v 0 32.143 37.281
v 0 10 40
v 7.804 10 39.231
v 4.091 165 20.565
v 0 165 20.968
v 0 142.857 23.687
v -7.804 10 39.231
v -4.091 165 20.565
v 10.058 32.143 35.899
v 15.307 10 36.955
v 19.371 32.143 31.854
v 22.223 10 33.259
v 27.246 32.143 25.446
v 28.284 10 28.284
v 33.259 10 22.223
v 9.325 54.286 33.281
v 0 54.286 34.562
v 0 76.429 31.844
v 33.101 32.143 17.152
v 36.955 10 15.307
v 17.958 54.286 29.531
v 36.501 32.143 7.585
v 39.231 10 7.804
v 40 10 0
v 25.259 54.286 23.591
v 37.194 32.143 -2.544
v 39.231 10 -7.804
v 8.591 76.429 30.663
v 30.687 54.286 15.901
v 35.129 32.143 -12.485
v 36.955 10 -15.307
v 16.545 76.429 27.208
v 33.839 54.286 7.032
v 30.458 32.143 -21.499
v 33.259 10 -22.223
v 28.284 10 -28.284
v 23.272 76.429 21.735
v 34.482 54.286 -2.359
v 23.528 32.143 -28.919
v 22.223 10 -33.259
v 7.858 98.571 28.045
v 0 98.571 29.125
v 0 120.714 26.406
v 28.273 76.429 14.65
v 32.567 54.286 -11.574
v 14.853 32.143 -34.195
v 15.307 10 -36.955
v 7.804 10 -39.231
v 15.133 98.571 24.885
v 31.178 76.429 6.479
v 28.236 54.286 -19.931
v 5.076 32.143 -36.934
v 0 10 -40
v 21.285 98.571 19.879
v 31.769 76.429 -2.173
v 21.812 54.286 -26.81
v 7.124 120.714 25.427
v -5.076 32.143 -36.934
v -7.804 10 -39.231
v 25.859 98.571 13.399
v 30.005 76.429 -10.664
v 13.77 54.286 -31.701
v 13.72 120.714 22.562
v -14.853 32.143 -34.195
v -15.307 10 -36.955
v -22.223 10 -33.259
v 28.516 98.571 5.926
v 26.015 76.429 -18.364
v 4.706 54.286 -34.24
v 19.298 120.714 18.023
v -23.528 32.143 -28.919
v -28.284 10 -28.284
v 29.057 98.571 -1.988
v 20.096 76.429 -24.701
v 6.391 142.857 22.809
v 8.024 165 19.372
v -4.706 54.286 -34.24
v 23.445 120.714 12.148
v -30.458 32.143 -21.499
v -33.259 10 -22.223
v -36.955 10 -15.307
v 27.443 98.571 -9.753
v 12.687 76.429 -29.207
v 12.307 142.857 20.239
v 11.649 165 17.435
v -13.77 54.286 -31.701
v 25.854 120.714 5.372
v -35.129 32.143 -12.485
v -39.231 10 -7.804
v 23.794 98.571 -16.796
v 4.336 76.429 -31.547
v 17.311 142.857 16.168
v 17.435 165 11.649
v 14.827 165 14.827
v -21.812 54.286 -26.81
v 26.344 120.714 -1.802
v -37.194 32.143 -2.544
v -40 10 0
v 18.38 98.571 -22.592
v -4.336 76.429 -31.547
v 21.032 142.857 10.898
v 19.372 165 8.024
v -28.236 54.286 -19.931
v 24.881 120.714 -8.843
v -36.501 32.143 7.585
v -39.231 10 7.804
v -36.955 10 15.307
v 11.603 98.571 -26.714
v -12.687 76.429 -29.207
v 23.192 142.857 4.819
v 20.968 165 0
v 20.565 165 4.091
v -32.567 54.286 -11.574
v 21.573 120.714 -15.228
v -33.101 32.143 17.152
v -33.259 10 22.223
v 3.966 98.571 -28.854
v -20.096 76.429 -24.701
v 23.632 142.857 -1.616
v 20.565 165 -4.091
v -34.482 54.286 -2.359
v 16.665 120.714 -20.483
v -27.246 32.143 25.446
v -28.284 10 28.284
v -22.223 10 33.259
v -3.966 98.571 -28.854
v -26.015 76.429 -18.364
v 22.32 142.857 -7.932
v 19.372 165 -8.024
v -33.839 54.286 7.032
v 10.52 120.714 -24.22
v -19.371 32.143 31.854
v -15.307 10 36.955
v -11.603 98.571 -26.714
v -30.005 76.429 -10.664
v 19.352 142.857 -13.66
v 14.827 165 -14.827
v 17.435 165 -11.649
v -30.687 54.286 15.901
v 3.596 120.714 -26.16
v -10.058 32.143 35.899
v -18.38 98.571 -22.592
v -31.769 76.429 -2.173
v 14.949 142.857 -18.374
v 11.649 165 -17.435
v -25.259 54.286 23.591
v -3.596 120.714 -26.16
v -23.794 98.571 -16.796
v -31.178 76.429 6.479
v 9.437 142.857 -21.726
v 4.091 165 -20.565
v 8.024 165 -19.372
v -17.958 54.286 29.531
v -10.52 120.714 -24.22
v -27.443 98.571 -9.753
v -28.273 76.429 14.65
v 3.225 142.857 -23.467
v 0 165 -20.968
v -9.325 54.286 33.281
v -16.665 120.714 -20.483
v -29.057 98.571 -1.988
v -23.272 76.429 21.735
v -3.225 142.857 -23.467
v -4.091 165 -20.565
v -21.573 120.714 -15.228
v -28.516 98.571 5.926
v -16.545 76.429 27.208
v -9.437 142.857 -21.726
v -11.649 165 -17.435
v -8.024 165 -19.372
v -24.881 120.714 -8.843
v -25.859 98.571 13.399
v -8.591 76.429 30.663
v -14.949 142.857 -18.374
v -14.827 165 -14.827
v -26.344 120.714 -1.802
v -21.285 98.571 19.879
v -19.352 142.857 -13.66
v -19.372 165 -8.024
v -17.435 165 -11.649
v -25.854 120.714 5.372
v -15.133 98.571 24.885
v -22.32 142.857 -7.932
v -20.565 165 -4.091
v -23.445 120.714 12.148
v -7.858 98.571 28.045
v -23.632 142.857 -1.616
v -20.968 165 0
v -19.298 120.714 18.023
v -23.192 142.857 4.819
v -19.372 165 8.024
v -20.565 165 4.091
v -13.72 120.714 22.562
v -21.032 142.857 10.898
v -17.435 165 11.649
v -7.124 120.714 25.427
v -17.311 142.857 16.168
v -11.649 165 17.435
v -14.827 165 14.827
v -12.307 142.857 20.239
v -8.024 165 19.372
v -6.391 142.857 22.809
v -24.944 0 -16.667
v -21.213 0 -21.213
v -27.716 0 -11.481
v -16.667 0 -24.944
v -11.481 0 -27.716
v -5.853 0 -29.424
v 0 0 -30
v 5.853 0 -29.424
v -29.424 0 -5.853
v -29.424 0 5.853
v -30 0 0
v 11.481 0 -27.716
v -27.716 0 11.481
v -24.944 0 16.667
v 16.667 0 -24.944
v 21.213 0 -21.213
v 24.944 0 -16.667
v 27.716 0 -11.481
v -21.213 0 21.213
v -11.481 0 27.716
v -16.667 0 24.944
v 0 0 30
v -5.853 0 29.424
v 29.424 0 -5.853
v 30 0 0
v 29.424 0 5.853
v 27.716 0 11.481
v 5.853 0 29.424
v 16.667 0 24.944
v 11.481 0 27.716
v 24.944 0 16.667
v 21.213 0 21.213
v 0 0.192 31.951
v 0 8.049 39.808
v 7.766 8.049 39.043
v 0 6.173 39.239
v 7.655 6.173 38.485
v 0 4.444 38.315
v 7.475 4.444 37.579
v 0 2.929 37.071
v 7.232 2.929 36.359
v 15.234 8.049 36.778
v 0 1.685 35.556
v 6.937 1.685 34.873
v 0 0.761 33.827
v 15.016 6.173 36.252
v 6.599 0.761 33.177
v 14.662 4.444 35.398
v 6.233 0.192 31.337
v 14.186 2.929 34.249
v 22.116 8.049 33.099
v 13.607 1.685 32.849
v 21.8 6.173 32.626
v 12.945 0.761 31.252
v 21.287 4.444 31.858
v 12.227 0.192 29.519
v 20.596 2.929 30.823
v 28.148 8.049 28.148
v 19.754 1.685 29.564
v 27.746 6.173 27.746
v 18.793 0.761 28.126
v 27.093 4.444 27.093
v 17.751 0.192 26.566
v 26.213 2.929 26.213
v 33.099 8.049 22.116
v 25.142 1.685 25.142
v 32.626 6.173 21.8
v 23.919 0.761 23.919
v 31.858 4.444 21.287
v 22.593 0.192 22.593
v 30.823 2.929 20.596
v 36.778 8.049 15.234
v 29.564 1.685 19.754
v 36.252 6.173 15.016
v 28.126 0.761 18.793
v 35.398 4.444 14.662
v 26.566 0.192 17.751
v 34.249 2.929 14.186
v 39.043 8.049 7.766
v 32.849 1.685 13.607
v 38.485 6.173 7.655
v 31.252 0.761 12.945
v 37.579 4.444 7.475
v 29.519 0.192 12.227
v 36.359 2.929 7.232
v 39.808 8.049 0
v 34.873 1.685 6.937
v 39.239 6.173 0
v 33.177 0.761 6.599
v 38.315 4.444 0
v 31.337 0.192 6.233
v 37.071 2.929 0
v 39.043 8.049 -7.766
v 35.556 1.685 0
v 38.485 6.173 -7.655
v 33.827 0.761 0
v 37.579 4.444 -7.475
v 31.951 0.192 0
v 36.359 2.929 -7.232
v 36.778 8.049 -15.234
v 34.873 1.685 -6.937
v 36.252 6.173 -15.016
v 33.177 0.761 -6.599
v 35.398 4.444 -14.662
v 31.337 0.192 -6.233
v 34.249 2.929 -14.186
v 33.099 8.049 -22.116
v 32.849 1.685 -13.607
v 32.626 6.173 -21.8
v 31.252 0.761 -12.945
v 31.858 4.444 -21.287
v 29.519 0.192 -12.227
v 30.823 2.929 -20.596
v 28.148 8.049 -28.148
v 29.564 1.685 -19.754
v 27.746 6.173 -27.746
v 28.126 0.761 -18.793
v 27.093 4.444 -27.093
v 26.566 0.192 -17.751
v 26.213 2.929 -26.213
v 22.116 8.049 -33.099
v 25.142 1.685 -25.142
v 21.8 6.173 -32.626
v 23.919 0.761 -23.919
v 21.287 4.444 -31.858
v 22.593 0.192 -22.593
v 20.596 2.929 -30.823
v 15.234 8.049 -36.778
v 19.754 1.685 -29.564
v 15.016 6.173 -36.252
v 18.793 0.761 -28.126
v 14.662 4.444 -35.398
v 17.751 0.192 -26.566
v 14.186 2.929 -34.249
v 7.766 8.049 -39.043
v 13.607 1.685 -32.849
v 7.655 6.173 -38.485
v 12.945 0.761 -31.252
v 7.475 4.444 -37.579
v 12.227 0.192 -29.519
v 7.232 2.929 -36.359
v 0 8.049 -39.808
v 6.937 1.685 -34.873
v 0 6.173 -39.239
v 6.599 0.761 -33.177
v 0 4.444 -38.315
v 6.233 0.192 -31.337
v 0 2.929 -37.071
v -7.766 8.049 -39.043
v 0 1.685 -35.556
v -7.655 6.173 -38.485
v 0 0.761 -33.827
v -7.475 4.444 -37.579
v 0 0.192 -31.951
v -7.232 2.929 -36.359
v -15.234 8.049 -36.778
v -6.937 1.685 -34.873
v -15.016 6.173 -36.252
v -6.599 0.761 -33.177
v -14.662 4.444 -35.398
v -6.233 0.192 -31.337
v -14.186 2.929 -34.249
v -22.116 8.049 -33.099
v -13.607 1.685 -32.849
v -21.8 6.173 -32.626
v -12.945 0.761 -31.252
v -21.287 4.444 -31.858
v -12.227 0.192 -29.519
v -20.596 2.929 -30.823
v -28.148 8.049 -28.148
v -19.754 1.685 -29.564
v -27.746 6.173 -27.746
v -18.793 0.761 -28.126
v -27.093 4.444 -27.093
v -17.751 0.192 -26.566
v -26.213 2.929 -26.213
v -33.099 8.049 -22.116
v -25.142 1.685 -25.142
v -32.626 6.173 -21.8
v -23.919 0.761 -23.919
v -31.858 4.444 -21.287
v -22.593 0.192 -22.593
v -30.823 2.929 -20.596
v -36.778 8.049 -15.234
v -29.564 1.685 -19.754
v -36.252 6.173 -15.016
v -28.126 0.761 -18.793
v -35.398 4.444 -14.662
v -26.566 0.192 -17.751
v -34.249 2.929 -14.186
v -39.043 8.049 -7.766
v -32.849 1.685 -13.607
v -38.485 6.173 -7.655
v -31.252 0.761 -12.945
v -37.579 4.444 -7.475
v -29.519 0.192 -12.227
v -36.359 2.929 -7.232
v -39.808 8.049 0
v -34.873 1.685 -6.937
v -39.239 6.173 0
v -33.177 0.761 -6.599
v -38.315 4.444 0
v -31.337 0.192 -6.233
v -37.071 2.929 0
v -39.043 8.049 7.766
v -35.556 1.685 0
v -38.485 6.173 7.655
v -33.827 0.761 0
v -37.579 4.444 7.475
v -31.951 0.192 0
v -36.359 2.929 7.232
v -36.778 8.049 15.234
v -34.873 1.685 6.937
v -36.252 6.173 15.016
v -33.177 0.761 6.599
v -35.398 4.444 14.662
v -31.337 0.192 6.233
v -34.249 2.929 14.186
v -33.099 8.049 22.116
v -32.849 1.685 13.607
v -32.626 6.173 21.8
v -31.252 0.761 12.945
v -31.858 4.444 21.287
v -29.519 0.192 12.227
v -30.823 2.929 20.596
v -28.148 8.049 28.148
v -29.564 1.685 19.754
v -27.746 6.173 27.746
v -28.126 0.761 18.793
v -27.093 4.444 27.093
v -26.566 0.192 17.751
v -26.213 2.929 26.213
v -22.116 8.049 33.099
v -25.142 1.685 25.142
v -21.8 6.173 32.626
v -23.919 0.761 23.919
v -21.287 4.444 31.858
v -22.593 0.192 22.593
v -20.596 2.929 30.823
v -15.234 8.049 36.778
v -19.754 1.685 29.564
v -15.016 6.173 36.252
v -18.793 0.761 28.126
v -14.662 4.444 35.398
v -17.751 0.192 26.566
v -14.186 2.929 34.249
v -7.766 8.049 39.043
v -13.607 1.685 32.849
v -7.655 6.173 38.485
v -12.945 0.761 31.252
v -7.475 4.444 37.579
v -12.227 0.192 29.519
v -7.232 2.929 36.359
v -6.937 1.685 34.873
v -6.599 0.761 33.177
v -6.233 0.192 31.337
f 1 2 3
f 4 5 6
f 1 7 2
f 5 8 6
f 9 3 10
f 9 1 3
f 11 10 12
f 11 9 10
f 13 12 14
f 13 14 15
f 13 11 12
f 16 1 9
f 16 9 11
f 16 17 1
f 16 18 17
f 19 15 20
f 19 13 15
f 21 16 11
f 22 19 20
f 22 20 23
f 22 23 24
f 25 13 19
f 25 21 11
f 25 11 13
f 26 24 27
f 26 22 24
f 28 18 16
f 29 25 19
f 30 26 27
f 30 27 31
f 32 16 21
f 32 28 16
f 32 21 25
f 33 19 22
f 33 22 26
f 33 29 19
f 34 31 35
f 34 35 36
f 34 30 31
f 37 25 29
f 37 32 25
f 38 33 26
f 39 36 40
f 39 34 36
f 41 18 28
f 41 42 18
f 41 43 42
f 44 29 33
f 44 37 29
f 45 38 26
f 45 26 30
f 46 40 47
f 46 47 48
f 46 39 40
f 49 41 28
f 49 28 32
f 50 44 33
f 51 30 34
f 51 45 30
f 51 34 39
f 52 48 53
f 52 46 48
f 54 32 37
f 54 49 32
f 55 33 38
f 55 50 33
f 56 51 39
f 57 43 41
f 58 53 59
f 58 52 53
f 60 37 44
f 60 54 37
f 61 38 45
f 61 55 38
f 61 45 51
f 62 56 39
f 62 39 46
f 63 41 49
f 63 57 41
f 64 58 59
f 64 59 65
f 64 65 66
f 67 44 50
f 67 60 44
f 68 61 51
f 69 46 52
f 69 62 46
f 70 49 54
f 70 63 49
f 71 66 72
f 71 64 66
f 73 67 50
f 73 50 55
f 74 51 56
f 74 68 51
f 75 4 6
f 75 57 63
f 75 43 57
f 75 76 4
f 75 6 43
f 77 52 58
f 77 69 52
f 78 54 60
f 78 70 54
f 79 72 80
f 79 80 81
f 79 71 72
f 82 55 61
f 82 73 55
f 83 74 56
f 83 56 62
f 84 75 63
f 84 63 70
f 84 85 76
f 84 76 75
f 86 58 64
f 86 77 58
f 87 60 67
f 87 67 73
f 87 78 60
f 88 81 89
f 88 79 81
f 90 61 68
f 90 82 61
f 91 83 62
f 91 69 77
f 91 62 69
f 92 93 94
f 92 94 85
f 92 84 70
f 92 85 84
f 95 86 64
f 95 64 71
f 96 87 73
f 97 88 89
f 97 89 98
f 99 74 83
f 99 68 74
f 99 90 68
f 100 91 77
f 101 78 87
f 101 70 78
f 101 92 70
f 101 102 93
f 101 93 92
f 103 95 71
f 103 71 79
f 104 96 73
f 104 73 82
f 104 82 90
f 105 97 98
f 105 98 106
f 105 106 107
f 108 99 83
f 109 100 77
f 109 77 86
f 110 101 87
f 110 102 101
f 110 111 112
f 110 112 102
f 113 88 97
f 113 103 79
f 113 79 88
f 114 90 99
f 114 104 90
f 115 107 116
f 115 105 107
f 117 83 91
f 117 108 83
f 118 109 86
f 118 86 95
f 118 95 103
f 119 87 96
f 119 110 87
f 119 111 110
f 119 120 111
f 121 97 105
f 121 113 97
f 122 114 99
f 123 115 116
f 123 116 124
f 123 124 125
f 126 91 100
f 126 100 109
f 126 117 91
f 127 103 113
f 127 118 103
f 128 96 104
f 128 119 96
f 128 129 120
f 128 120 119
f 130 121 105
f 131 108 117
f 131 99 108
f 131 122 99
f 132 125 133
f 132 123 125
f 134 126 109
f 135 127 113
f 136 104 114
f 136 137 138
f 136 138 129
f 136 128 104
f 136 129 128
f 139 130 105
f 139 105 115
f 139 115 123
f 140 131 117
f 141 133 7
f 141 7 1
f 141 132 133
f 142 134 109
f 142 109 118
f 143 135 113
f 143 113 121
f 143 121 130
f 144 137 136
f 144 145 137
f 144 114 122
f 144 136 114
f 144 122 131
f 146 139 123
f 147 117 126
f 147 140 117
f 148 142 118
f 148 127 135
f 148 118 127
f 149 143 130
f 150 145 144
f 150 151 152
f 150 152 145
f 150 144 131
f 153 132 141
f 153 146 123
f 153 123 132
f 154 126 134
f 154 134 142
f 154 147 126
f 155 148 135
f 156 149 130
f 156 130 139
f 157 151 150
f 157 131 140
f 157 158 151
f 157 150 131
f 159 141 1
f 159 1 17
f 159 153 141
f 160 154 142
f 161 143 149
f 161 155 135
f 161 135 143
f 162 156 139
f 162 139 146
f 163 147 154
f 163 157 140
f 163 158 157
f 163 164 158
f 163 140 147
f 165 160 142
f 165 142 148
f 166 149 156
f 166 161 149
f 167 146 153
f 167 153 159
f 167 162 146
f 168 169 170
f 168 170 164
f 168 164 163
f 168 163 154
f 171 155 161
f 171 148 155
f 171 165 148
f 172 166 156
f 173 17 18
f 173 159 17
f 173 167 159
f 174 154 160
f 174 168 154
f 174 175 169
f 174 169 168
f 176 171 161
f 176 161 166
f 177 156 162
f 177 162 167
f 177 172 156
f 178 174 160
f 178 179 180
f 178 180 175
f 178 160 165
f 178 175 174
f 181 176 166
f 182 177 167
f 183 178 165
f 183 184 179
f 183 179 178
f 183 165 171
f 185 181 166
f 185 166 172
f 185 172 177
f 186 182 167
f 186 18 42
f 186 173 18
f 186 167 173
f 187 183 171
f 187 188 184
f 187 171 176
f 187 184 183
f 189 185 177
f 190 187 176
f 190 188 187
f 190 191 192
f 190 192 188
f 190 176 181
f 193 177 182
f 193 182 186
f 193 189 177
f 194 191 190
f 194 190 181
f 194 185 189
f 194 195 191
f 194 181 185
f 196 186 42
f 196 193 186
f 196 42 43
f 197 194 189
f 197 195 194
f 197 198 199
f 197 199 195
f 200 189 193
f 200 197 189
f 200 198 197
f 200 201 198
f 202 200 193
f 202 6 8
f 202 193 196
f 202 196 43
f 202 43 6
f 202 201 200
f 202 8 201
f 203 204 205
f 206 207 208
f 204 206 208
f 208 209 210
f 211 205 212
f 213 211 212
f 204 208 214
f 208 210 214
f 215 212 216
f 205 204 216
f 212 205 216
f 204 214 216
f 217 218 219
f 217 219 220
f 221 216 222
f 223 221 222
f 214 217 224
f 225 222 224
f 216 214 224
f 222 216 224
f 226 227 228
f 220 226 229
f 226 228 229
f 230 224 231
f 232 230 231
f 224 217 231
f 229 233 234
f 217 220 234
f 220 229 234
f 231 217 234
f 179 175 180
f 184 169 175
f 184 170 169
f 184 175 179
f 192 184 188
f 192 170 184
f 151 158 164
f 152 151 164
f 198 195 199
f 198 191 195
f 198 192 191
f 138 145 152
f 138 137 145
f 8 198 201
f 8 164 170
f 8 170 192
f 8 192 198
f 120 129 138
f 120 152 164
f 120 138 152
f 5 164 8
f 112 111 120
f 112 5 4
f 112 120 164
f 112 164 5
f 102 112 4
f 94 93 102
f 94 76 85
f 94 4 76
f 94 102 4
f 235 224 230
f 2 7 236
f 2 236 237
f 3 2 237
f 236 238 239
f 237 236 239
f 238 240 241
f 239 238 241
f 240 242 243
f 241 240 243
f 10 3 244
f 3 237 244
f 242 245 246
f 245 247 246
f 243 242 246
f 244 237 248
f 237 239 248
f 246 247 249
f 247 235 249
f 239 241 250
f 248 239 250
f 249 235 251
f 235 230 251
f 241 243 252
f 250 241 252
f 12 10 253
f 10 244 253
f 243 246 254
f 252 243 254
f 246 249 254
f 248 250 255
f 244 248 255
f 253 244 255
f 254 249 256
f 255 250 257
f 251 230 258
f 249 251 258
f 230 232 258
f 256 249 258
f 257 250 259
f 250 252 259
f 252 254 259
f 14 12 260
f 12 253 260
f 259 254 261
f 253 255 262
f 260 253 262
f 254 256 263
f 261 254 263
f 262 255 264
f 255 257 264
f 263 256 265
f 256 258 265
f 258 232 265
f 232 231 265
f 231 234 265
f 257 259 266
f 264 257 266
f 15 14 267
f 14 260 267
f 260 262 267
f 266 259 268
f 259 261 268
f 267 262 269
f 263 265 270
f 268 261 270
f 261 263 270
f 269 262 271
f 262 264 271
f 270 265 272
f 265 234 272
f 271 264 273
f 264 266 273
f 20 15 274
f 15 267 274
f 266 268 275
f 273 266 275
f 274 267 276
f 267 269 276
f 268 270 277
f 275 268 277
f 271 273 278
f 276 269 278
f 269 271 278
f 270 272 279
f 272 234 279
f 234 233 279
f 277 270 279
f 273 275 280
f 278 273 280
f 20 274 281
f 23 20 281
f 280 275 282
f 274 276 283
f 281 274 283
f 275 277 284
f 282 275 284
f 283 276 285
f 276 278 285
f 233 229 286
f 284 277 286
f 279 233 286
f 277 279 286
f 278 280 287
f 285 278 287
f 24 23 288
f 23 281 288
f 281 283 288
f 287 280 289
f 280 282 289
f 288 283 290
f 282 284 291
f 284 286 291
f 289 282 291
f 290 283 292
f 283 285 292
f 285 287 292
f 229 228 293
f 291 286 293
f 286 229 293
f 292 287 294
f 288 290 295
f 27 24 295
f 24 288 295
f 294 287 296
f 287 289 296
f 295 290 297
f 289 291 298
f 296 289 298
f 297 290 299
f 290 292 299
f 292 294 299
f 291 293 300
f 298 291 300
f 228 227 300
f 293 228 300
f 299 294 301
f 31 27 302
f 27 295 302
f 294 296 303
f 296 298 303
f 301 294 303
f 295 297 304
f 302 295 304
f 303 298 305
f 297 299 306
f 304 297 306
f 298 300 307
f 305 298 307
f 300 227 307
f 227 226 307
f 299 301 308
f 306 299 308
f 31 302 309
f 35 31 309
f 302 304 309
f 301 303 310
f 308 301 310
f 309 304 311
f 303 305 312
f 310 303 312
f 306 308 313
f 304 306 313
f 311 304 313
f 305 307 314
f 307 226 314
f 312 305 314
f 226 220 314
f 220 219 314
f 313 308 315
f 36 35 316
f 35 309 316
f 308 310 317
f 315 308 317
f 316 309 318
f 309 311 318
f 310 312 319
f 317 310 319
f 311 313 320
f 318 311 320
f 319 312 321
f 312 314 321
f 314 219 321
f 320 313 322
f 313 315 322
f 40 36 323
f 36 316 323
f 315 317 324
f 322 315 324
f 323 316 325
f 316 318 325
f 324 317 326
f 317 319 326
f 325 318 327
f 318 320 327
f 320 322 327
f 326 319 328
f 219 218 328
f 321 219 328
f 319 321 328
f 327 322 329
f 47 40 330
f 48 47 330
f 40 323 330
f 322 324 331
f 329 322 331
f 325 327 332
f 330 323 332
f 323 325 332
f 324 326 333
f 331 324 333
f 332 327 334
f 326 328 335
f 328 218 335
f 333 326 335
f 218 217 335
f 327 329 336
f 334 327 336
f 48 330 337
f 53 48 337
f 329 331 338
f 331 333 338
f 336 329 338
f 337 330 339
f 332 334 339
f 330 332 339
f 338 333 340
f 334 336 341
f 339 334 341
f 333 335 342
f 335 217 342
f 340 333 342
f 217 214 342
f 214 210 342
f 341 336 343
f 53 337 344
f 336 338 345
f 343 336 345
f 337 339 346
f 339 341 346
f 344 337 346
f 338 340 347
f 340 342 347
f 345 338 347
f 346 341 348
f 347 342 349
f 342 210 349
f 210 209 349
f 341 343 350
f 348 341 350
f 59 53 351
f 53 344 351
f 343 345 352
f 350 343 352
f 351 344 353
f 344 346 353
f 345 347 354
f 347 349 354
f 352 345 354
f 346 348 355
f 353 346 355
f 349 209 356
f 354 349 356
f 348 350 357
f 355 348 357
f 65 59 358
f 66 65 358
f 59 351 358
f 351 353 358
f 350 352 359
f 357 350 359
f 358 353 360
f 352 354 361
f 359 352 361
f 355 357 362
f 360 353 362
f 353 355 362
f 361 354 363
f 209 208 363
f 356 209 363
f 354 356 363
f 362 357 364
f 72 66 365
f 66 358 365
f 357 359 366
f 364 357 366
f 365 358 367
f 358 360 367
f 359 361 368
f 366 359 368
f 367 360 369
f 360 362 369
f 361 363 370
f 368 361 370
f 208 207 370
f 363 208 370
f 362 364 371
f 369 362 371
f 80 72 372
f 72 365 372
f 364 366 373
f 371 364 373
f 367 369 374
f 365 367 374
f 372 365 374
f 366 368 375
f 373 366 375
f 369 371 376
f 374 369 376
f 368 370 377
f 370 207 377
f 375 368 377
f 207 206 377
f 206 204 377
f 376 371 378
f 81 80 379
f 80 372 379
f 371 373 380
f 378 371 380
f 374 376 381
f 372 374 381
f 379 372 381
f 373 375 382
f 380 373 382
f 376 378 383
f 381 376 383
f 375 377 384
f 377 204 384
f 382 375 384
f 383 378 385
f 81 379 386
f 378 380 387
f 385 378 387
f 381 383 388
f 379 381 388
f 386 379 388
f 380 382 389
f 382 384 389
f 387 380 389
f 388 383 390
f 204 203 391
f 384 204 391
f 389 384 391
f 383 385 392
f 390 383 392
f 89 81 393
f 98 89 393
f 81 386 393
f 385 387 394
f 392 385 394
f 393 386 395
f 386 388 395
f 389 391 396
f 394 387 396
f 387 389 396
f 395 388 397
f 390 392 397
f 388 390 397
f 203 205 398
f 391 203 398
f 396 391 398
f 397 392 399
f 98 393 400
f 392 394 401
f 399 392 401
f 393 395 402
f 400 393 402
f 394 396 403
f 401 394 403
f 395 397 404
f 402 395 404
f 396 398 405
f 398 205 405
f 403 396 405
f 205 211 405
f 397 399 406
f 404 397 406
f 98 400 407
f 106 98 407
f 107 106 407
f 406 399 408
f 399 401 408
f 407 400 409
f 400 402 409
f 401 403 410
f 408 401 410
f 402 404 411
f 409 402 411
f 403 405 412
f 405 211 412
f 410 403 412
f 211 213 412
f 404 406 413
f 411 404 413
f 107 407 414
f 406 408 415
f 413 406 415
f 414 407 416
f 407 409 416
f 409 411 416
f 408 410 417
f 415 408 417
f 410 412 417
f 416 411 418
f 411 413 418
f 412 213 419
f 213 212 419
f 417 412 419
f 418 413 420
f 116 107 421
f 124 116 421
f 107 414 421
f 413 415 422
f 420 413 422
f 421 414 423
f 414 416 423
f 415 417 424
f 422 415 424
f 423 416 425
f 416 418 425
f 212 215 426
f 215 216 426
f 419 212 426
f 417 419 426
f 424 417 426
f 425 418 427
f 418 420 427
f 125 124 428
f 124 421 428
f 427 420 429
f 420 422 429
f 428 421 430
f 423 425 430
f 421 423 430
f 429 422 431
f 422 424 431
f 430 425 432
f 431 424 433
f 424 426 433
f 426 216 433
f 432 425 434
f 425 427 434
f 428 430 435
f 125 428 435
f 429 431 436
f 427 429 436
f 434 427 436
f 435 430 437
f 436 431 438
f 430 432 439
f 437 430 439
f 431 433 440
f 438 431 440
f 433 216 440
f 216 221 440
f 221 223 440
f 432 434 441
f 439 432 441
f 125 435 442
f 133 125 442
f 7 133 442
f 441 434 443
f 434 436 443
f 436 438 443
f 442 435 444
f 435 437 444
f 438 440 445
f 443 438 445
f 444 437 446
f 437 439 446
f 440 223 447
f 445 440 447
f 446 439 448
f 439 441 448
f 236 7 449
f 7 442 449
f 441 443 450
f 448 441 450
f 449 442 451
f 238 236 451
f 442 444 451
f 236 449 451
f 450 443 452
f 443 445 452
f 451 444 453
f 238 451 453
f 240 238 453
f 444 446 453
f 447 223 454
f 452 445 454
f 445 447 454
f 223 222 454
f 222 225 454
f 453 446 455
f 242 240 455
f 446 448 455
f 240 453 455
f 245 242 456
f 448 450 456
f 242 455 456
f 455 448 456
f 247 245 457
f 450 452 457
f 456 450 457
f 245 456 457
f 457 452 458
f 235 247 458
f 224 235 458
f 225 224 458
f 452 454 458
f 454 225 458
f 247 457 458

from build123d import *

# Parameters (mm, degrees)
SKETCH2_R           = 40
BOSS_EXTRUDE2_DEPTH = 10
SKETCH3_R           = 40
BOSS_EXTRUDE4_DEPTH = 155
BOSS_EXTRUDE4_TAPER = 7
FILLET4_R           = 10


with BuildPart() as part:
    # Sketch2 → Boss-Extrude2 (new body)
    with BuildSketch(Plane(origin=(0, 0, 0), x_dir=(1, 0, 0), z_dir=(0, 1, 0))):
        with Locations(Location((0, 0, 0), (0, 0, 270))):
            Circle(SKETCH2_R)
    extrude(amount=BOSS_EXTRUDE2_DEPTH)

    # Sketch3 → Boss-Extrude4 (add)
    with BuildSketch(Plane(origin=(0, 10, 0), x_dir=(1, 0, 0), z_dir=(0, 1, 0))):
        with Locations(Location((0, 0, 0), (0, 0, 270))):
            Circle(SKETCH3_R)
    extrude(amount=BOSS_EXTRUDE4_DEPTH, taper=BOSS_EXTRUDE4_TAPER)

    # Fillet4
    fillet4_edges = [part.edges().sort_by_distance(p)[0] for p in [
        (0, 0, -40),
    ]]
    fillet(fillet4_edges, radius=FILLET4_R - 0.0001)  # a hair under: the kernel refuses the full size


solid = part.part
